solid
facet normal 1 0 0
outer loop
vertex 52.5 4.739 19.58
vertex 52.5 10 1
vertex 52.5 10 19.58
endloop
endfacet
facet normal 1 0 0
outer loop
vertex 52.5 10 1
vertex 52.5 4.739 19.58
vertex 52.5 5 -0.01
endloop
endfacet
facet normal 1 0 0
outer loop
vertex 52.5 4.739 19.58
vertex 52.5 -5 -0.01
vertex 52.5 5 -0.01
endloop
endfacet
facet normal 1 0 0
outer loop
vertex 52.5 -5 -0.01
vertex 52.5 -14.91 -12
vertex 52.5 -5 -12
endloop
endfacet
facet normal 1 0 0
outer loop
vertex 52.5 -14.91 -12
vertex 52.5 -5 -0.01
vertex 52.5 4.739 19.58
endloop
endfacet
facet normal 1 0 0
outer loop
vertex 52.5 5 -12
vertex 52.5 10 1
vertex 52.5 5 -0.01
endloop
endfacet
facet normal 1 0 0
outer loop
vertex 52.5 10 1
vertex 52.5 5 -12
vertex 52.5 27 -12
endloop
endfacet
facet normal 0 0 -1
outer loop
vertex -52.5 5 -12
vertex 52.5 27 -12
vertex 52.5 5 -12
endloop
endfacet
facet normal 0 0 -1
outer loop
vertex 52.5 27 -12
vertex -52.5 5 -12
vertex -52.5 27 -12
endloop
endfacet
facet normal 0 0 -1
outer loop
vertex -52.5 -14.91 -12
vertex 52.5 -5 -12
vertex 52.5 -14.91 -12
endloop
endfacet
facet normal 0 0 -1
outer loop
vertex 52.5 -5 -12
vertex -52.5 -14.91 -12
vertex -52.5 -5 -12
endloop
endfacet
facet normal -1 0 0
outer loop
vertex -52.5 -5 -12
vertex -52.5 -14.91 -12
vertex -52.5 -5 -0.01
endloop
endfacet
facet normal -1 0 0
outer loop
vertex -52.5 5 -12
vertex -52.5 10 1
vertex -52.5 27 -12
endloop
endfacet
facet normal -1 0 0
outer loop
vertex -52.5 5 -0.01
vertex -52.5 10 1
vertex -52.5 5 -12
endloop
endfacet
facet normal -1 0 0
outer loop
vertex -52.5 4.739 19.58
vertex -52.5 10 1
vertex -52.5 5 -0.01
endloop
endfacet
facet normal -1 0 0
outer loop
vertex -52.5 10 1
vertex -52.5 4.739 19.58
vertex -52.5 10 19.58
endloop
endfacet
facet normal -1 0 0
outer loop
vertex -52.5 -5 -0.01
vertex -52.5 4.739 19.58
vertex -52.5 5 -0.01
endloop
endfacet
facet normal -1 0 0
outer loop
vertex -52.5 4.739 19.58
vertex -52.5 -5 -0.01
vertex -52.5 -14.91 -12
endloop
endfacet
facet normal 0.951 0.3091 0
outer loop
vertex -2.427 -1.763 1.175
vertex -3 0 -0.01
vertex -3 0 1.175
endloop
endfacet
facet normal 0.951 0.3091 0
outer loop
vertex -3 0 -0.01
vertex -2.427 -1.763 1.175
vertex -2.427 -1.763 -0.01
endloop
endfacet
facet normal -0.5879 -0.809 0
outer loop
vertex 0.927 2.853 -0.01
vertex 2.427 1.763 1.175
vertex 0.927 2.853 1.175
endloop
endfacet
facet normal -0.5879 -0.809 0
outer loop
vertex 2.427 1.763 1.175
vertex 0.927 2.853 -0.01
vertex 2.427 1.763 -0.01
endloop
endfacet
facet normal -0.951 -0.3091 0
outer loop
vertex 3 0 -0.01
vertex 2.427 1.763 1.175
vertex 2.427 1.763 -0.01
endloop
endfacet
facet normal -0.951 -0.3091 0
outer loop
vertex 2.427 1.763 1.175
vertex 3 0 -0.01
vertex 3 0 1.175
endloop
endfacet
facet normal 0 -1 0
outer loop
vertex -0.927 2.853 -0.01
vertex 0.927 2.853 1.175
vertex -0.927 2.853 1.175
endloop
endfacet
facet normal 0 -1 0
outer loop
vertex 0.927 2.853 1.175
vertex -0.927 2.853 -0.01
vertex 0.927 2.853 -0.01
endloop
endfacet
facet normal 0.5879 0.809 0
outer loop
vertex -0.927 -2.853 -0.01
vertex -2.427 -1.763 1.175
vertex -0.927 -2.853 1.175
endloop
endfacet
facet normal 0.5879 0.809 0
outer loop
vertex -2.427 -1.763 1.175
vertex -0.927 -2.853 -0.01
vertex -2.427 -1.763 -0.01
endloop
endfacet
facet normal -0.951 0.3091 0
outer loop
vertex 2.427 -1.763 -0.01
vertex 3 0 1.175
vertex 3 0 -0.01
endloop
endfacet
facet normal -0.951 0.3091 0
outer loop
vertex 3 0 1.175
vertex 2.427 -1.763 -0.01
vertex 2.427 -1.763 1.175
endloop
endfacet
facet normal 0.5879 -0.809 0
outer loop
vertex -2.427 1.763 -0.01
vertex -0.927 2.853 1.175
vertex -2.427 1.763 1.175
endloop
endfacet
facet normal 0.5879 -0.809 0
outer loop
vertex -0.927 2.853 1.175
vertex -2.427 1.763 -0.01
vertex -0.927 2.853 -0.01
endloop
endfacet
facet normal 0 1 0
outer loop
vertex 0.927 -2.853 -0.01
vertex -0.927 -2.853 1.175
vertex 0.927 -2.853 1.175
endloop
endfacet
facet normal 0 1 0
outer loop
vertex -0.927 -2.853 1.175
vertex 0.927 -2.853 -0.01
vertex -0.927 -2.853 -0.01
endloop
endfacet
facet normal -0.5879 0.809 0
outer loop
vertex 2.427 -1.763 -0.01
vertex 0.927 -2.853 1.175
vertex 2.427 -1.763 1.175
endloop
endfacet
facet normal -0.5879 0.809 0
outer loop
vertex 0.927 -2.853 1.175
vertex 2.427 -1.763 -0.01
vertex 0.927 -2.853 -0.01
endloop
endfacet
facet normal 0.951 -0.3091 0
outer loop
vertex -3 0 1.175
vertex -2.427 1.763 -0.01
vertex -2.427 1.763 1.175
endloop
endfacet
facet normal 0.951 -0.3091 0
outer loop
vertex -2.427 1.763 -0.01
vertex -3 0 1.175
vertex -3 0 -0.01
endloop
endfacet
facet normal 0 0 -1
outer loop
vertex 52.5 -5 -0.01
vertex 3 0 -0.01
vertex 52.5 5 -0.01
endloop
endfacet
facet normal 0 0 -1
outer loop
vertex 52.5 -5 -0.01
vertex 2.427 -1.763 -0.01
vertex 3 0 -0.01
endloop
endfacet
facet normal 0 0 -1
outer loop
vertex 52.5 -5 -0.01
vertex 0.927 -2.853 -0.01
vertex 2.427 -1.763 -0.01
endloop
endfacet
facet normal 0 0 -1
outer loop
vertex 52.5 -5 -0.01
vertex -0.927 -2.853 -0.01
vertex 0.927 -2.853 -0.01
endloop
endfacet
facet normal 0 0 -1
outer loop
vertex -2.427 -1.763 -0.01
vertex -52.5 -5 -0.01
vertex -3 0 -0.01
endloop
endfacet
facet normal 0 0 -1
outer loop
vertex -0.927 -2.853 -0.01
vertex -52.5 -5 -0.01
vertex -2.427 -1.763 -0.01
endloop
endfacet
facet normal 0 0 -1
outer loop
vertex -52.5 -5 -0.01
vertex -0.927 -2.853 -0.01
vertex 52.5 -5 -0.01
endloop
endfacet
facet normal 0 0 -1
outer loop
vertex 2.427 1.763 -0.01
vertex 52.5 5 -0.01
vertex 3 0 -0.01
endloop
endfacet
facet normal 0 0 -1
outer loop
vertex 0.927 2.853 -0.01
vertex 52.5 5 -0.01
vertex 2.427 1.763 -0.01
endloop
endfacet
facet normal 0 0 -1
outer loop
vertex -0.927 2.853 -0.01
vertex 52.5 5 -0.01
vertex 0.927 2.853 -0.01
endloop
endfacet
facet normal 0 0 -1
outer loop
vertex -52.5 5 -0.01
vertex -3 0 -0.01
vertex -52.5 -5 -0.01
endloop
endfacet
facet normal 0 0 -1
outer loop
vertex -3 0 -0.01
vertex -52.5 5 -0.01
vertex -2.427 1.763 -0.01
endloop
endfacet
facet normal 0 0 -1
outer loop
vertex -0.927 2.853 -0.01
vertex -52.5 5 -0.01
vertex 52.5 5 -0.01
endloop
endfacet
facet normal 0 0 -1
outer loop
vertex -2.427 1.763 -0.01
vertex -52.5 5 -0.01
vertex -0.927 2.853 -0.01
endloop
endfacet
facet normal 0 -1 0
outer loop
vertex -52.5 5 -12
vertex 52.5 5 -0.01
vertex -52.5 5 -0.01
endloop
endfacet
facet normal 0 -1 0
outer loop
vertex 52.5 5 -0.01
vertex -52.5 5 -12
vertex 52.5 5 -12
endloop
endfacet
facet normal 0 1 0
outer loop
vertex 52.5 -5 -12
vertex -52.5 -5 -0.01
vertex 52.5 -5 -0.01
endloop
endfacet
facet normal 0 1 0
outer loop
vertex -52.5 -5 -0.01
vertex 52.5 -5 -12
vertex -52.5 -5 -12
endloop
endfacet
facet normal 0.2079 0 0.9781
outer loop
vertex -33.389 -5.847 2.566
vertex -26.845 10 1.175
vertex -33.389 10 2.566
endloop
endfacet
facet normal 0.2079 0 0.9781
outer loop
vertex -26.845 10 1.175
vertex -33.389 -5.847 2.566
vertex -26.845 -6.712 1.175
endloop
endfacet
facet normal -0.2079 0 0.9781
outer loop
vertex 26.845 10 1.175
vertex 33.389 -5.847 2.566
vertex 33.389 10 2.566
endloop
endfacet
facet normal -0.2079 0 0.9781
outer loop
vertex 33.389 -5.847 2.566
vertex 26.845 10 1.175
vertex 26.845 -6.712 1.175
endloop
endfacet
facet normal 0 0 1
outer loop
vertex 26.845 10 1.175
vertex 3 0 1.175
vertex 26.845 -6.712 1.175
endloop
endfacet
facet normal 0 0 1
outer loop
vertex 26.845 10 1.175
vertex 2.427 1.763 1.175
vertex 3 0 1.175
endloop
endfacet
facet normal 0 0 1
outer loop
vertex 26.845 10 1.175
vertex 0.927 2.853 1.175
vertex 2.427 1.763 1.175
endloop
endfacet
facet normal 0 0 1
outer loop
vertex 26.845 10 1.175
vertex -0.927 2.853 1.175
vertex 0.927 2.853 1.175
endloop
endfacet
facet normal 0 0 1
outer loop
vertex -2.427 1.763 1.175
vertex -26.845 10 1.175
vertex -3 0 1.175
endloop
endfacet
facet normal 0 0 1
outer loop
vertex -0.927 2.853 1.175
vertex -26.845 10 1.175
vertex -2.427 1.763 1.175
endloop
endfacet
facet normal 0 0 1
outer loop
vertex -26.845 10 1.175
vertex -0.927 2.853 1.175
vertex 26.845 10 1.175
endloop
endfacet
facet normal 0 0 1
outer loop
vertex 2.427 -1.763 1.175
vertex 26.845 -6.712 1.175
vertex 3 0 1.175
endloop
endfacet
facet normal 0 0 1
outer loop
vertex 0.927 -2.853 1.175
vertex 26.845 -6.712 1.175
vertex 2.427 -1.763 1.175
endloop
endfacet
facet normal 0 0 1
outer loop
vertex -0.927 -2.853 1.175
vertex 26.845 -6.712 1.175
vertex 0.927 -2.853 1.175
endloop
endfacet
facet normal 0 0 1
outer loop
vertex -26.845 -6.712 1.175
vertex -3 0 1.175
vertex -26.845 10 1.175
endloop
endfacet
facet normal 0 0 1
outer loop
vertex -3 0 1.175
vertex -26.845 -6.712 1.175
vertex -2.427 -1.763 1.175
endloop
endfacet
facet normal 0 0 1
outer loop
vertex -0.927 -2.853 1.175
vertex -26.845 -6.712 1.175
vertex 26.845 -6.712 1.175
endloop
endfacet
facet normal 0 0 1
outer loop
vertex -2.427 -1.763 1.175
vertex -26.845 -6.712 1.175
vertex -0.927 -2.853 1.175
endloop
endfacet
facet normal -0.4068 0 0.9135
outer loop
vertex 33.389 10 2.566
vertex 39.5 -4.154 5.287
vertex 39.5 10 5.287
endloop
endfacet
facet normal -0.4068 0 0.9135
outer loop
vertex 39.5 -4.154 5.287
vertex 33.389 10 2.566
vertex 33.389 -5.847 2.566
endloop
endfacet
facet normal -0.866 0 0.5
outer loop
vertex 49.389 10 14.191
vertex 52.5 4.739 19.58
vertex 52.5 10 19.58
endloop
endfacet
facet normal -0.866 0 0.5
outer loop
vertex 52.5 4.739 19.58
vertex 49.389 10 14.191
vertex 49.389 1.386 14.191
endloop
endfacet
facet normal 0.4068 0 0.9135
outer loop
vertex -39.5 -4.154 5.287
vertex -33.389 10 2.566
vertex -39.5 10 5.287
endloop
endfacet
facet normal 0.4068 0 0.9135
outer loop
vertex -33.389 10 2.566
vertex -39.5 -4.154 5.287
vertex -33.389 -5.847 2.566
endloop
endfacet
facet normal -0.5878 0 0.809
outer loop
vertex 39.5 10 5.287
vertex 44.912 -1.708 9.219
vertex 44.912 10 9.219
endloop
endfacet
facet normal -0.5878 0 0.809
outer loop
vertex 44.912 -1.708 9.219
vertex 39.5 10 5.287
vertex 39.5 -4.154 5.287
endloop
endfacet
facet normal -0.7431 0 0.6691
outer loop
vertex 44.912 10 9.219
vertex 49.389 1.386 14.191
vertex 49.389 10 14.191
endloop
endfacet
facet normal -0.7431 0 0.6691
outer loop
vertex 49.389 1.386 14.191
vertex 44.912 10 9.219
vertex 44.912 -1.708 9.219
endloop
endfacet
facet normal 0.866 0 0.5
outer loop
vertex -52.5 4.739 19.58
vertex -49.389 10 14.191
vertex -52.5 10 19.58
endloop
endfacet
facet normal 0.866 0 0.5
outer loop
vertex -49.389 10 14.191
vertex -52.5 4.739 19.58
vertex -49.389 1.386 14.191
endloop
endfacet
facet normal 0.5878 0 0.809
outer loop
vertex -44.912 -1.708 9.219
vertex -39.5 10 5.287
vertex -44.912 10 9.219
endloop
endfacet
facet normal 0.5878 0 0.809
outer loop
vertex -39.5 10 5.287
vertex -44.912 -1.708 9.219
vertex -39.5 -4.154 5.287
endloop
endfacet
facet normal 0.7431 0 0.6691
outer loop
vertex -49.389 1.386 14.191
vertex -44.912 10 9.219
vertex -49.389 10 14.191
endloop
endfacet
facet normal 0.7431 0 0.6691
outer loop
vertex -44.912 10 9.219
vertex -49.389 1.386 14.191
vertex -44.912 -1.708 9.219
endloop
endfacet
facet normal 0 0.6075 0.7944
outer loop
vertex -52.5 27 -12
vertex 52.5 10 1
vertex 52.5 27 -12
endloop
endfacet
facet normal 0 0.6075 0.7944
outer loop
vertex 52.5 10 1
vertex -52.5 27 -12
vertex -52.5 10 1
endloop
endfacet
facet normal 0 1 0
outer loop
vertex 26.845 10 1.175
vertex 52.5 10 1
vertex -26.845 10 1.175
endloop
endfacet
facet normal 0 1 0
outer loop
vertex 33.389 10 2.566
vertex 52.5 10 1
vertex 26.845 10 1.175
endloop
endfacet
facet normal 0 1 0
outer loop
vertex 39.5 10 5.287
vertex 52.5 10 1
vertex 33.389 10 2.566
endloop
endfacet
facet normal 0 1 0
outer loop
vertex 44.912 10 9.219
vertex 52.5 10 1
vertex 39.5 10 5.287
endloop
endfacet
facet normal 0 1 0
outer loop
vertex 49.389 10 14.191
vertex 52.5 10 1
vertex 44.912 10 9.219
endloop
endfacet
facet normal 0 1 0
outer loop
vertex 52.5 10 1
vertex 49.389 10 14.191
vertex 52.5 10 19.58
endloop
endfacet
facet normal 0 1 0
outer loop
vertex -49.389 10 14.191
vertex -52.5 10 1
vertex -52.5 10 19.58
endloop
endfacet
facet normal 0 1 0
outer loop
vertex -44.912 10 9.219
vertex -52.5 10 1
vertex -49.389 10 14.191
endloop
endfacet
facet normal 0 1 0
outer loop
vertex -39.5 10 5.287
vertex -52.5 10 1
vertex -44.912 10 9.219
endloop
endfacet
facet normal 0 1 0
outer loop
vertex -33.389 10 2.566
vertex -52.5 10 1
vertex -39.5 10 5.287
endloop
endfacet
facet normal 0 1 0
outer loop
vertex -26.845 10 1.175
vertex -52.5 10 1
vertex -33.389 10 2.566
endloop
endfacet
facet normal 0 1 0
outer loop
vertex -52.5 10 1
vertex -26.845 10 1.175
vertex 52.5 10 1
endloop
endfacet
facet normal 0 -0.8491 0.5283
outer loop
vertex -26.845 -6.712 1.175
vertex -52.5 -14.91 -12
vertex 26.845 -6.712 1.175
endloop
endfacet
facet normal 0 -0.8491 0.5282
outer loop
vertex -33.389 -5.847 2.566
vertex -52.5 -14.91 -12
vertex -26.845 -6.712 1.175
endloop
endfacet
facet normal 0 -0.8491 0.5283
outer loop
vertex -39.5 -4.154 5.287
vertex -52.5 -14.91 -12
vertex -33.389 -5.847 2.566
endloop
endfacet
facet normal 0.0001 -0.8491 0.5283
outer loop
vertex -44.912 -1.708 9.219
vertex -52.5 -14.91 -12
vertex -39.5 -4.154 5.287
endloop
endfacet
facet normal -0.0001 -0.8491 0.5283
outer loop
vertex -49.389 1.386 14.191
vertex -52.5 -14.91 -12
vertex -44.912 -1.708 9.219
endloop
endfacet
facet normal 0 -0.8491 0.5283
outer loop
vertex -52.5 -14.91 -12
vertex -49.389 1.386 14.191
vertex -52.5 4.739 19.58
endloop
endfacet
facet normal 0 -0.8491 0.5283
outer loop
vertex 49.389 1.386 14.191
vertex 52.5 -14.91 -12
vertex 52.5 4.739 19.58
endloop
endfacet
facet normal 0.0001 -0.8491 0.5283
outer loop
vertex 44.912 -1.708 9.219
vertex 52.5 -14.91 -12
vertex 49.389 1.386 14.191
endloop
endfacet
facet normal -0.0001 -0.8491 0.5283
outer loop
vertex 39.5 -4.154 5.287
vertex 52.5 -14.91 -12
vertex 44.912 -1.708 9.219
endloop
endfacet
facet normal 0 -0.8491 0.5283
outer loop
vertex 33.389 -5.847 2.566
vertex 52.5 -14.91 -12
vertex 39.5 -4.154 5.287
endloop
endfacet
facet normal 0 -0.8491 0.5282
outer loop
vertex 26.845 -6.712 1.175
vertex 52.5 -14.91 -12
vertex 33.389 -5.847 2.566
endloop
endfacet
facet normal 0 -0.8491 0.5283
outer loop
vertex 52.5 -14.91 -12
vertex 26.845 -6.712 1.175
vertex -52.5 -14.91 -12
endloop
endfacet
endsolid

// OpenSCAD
plugD = 6;
plugW = 10;
plugH = 12;

l = 105;
h = 20 + plugH;

w1 = 20;
w2 = 42;

y = 15;

t = 1.0;

difference()
{
    translate([ -l / 2, -y, -plugH ]) cube([ l, w2, h ]);

    translate([ 0, 0, -plugH - .01 ]) cylinder(d = plugD, h = h + .02);
    translate([ -l / 2 - .01, -plugW / 2, -plugH - .01 ]) cube([ l + .02, plugW, plugH ]);

    r = h;
    hull()
    {
        translate([ plugH / 4 + l / 2 - r, .01 + w2 - y, r + t ]) rotate([ 90, 0, 0 ]) cylinder(r = r, h = w2 + .02);
        translate([ -l / 2 + r - plugH / 4, .01 + w2 - y, r + t ]) rotate([ 90, 0, 0 ]) cylinder(r = r, h = w2 + .02);
    }
    hull()
    {
        translate([ -l / 2 - .01, w1 / 2, t ]) cube([ l + .02, 0.1, h ]);
        translate([ -l / 2 - .01, w2 - y, -plugH ]) cube([ l + .02, 0.1, h ]);
    }
    hull()
    {
        translate([ -l / 2 - .01, -y - .01, -plugH ]) cube([ l + .02, 0.1, 0.1 ]);
        translate([ -l / 2 - .01, -y, h - plugH ]) cube([ l + .02, w1, 0.1 ]);
    }
}
